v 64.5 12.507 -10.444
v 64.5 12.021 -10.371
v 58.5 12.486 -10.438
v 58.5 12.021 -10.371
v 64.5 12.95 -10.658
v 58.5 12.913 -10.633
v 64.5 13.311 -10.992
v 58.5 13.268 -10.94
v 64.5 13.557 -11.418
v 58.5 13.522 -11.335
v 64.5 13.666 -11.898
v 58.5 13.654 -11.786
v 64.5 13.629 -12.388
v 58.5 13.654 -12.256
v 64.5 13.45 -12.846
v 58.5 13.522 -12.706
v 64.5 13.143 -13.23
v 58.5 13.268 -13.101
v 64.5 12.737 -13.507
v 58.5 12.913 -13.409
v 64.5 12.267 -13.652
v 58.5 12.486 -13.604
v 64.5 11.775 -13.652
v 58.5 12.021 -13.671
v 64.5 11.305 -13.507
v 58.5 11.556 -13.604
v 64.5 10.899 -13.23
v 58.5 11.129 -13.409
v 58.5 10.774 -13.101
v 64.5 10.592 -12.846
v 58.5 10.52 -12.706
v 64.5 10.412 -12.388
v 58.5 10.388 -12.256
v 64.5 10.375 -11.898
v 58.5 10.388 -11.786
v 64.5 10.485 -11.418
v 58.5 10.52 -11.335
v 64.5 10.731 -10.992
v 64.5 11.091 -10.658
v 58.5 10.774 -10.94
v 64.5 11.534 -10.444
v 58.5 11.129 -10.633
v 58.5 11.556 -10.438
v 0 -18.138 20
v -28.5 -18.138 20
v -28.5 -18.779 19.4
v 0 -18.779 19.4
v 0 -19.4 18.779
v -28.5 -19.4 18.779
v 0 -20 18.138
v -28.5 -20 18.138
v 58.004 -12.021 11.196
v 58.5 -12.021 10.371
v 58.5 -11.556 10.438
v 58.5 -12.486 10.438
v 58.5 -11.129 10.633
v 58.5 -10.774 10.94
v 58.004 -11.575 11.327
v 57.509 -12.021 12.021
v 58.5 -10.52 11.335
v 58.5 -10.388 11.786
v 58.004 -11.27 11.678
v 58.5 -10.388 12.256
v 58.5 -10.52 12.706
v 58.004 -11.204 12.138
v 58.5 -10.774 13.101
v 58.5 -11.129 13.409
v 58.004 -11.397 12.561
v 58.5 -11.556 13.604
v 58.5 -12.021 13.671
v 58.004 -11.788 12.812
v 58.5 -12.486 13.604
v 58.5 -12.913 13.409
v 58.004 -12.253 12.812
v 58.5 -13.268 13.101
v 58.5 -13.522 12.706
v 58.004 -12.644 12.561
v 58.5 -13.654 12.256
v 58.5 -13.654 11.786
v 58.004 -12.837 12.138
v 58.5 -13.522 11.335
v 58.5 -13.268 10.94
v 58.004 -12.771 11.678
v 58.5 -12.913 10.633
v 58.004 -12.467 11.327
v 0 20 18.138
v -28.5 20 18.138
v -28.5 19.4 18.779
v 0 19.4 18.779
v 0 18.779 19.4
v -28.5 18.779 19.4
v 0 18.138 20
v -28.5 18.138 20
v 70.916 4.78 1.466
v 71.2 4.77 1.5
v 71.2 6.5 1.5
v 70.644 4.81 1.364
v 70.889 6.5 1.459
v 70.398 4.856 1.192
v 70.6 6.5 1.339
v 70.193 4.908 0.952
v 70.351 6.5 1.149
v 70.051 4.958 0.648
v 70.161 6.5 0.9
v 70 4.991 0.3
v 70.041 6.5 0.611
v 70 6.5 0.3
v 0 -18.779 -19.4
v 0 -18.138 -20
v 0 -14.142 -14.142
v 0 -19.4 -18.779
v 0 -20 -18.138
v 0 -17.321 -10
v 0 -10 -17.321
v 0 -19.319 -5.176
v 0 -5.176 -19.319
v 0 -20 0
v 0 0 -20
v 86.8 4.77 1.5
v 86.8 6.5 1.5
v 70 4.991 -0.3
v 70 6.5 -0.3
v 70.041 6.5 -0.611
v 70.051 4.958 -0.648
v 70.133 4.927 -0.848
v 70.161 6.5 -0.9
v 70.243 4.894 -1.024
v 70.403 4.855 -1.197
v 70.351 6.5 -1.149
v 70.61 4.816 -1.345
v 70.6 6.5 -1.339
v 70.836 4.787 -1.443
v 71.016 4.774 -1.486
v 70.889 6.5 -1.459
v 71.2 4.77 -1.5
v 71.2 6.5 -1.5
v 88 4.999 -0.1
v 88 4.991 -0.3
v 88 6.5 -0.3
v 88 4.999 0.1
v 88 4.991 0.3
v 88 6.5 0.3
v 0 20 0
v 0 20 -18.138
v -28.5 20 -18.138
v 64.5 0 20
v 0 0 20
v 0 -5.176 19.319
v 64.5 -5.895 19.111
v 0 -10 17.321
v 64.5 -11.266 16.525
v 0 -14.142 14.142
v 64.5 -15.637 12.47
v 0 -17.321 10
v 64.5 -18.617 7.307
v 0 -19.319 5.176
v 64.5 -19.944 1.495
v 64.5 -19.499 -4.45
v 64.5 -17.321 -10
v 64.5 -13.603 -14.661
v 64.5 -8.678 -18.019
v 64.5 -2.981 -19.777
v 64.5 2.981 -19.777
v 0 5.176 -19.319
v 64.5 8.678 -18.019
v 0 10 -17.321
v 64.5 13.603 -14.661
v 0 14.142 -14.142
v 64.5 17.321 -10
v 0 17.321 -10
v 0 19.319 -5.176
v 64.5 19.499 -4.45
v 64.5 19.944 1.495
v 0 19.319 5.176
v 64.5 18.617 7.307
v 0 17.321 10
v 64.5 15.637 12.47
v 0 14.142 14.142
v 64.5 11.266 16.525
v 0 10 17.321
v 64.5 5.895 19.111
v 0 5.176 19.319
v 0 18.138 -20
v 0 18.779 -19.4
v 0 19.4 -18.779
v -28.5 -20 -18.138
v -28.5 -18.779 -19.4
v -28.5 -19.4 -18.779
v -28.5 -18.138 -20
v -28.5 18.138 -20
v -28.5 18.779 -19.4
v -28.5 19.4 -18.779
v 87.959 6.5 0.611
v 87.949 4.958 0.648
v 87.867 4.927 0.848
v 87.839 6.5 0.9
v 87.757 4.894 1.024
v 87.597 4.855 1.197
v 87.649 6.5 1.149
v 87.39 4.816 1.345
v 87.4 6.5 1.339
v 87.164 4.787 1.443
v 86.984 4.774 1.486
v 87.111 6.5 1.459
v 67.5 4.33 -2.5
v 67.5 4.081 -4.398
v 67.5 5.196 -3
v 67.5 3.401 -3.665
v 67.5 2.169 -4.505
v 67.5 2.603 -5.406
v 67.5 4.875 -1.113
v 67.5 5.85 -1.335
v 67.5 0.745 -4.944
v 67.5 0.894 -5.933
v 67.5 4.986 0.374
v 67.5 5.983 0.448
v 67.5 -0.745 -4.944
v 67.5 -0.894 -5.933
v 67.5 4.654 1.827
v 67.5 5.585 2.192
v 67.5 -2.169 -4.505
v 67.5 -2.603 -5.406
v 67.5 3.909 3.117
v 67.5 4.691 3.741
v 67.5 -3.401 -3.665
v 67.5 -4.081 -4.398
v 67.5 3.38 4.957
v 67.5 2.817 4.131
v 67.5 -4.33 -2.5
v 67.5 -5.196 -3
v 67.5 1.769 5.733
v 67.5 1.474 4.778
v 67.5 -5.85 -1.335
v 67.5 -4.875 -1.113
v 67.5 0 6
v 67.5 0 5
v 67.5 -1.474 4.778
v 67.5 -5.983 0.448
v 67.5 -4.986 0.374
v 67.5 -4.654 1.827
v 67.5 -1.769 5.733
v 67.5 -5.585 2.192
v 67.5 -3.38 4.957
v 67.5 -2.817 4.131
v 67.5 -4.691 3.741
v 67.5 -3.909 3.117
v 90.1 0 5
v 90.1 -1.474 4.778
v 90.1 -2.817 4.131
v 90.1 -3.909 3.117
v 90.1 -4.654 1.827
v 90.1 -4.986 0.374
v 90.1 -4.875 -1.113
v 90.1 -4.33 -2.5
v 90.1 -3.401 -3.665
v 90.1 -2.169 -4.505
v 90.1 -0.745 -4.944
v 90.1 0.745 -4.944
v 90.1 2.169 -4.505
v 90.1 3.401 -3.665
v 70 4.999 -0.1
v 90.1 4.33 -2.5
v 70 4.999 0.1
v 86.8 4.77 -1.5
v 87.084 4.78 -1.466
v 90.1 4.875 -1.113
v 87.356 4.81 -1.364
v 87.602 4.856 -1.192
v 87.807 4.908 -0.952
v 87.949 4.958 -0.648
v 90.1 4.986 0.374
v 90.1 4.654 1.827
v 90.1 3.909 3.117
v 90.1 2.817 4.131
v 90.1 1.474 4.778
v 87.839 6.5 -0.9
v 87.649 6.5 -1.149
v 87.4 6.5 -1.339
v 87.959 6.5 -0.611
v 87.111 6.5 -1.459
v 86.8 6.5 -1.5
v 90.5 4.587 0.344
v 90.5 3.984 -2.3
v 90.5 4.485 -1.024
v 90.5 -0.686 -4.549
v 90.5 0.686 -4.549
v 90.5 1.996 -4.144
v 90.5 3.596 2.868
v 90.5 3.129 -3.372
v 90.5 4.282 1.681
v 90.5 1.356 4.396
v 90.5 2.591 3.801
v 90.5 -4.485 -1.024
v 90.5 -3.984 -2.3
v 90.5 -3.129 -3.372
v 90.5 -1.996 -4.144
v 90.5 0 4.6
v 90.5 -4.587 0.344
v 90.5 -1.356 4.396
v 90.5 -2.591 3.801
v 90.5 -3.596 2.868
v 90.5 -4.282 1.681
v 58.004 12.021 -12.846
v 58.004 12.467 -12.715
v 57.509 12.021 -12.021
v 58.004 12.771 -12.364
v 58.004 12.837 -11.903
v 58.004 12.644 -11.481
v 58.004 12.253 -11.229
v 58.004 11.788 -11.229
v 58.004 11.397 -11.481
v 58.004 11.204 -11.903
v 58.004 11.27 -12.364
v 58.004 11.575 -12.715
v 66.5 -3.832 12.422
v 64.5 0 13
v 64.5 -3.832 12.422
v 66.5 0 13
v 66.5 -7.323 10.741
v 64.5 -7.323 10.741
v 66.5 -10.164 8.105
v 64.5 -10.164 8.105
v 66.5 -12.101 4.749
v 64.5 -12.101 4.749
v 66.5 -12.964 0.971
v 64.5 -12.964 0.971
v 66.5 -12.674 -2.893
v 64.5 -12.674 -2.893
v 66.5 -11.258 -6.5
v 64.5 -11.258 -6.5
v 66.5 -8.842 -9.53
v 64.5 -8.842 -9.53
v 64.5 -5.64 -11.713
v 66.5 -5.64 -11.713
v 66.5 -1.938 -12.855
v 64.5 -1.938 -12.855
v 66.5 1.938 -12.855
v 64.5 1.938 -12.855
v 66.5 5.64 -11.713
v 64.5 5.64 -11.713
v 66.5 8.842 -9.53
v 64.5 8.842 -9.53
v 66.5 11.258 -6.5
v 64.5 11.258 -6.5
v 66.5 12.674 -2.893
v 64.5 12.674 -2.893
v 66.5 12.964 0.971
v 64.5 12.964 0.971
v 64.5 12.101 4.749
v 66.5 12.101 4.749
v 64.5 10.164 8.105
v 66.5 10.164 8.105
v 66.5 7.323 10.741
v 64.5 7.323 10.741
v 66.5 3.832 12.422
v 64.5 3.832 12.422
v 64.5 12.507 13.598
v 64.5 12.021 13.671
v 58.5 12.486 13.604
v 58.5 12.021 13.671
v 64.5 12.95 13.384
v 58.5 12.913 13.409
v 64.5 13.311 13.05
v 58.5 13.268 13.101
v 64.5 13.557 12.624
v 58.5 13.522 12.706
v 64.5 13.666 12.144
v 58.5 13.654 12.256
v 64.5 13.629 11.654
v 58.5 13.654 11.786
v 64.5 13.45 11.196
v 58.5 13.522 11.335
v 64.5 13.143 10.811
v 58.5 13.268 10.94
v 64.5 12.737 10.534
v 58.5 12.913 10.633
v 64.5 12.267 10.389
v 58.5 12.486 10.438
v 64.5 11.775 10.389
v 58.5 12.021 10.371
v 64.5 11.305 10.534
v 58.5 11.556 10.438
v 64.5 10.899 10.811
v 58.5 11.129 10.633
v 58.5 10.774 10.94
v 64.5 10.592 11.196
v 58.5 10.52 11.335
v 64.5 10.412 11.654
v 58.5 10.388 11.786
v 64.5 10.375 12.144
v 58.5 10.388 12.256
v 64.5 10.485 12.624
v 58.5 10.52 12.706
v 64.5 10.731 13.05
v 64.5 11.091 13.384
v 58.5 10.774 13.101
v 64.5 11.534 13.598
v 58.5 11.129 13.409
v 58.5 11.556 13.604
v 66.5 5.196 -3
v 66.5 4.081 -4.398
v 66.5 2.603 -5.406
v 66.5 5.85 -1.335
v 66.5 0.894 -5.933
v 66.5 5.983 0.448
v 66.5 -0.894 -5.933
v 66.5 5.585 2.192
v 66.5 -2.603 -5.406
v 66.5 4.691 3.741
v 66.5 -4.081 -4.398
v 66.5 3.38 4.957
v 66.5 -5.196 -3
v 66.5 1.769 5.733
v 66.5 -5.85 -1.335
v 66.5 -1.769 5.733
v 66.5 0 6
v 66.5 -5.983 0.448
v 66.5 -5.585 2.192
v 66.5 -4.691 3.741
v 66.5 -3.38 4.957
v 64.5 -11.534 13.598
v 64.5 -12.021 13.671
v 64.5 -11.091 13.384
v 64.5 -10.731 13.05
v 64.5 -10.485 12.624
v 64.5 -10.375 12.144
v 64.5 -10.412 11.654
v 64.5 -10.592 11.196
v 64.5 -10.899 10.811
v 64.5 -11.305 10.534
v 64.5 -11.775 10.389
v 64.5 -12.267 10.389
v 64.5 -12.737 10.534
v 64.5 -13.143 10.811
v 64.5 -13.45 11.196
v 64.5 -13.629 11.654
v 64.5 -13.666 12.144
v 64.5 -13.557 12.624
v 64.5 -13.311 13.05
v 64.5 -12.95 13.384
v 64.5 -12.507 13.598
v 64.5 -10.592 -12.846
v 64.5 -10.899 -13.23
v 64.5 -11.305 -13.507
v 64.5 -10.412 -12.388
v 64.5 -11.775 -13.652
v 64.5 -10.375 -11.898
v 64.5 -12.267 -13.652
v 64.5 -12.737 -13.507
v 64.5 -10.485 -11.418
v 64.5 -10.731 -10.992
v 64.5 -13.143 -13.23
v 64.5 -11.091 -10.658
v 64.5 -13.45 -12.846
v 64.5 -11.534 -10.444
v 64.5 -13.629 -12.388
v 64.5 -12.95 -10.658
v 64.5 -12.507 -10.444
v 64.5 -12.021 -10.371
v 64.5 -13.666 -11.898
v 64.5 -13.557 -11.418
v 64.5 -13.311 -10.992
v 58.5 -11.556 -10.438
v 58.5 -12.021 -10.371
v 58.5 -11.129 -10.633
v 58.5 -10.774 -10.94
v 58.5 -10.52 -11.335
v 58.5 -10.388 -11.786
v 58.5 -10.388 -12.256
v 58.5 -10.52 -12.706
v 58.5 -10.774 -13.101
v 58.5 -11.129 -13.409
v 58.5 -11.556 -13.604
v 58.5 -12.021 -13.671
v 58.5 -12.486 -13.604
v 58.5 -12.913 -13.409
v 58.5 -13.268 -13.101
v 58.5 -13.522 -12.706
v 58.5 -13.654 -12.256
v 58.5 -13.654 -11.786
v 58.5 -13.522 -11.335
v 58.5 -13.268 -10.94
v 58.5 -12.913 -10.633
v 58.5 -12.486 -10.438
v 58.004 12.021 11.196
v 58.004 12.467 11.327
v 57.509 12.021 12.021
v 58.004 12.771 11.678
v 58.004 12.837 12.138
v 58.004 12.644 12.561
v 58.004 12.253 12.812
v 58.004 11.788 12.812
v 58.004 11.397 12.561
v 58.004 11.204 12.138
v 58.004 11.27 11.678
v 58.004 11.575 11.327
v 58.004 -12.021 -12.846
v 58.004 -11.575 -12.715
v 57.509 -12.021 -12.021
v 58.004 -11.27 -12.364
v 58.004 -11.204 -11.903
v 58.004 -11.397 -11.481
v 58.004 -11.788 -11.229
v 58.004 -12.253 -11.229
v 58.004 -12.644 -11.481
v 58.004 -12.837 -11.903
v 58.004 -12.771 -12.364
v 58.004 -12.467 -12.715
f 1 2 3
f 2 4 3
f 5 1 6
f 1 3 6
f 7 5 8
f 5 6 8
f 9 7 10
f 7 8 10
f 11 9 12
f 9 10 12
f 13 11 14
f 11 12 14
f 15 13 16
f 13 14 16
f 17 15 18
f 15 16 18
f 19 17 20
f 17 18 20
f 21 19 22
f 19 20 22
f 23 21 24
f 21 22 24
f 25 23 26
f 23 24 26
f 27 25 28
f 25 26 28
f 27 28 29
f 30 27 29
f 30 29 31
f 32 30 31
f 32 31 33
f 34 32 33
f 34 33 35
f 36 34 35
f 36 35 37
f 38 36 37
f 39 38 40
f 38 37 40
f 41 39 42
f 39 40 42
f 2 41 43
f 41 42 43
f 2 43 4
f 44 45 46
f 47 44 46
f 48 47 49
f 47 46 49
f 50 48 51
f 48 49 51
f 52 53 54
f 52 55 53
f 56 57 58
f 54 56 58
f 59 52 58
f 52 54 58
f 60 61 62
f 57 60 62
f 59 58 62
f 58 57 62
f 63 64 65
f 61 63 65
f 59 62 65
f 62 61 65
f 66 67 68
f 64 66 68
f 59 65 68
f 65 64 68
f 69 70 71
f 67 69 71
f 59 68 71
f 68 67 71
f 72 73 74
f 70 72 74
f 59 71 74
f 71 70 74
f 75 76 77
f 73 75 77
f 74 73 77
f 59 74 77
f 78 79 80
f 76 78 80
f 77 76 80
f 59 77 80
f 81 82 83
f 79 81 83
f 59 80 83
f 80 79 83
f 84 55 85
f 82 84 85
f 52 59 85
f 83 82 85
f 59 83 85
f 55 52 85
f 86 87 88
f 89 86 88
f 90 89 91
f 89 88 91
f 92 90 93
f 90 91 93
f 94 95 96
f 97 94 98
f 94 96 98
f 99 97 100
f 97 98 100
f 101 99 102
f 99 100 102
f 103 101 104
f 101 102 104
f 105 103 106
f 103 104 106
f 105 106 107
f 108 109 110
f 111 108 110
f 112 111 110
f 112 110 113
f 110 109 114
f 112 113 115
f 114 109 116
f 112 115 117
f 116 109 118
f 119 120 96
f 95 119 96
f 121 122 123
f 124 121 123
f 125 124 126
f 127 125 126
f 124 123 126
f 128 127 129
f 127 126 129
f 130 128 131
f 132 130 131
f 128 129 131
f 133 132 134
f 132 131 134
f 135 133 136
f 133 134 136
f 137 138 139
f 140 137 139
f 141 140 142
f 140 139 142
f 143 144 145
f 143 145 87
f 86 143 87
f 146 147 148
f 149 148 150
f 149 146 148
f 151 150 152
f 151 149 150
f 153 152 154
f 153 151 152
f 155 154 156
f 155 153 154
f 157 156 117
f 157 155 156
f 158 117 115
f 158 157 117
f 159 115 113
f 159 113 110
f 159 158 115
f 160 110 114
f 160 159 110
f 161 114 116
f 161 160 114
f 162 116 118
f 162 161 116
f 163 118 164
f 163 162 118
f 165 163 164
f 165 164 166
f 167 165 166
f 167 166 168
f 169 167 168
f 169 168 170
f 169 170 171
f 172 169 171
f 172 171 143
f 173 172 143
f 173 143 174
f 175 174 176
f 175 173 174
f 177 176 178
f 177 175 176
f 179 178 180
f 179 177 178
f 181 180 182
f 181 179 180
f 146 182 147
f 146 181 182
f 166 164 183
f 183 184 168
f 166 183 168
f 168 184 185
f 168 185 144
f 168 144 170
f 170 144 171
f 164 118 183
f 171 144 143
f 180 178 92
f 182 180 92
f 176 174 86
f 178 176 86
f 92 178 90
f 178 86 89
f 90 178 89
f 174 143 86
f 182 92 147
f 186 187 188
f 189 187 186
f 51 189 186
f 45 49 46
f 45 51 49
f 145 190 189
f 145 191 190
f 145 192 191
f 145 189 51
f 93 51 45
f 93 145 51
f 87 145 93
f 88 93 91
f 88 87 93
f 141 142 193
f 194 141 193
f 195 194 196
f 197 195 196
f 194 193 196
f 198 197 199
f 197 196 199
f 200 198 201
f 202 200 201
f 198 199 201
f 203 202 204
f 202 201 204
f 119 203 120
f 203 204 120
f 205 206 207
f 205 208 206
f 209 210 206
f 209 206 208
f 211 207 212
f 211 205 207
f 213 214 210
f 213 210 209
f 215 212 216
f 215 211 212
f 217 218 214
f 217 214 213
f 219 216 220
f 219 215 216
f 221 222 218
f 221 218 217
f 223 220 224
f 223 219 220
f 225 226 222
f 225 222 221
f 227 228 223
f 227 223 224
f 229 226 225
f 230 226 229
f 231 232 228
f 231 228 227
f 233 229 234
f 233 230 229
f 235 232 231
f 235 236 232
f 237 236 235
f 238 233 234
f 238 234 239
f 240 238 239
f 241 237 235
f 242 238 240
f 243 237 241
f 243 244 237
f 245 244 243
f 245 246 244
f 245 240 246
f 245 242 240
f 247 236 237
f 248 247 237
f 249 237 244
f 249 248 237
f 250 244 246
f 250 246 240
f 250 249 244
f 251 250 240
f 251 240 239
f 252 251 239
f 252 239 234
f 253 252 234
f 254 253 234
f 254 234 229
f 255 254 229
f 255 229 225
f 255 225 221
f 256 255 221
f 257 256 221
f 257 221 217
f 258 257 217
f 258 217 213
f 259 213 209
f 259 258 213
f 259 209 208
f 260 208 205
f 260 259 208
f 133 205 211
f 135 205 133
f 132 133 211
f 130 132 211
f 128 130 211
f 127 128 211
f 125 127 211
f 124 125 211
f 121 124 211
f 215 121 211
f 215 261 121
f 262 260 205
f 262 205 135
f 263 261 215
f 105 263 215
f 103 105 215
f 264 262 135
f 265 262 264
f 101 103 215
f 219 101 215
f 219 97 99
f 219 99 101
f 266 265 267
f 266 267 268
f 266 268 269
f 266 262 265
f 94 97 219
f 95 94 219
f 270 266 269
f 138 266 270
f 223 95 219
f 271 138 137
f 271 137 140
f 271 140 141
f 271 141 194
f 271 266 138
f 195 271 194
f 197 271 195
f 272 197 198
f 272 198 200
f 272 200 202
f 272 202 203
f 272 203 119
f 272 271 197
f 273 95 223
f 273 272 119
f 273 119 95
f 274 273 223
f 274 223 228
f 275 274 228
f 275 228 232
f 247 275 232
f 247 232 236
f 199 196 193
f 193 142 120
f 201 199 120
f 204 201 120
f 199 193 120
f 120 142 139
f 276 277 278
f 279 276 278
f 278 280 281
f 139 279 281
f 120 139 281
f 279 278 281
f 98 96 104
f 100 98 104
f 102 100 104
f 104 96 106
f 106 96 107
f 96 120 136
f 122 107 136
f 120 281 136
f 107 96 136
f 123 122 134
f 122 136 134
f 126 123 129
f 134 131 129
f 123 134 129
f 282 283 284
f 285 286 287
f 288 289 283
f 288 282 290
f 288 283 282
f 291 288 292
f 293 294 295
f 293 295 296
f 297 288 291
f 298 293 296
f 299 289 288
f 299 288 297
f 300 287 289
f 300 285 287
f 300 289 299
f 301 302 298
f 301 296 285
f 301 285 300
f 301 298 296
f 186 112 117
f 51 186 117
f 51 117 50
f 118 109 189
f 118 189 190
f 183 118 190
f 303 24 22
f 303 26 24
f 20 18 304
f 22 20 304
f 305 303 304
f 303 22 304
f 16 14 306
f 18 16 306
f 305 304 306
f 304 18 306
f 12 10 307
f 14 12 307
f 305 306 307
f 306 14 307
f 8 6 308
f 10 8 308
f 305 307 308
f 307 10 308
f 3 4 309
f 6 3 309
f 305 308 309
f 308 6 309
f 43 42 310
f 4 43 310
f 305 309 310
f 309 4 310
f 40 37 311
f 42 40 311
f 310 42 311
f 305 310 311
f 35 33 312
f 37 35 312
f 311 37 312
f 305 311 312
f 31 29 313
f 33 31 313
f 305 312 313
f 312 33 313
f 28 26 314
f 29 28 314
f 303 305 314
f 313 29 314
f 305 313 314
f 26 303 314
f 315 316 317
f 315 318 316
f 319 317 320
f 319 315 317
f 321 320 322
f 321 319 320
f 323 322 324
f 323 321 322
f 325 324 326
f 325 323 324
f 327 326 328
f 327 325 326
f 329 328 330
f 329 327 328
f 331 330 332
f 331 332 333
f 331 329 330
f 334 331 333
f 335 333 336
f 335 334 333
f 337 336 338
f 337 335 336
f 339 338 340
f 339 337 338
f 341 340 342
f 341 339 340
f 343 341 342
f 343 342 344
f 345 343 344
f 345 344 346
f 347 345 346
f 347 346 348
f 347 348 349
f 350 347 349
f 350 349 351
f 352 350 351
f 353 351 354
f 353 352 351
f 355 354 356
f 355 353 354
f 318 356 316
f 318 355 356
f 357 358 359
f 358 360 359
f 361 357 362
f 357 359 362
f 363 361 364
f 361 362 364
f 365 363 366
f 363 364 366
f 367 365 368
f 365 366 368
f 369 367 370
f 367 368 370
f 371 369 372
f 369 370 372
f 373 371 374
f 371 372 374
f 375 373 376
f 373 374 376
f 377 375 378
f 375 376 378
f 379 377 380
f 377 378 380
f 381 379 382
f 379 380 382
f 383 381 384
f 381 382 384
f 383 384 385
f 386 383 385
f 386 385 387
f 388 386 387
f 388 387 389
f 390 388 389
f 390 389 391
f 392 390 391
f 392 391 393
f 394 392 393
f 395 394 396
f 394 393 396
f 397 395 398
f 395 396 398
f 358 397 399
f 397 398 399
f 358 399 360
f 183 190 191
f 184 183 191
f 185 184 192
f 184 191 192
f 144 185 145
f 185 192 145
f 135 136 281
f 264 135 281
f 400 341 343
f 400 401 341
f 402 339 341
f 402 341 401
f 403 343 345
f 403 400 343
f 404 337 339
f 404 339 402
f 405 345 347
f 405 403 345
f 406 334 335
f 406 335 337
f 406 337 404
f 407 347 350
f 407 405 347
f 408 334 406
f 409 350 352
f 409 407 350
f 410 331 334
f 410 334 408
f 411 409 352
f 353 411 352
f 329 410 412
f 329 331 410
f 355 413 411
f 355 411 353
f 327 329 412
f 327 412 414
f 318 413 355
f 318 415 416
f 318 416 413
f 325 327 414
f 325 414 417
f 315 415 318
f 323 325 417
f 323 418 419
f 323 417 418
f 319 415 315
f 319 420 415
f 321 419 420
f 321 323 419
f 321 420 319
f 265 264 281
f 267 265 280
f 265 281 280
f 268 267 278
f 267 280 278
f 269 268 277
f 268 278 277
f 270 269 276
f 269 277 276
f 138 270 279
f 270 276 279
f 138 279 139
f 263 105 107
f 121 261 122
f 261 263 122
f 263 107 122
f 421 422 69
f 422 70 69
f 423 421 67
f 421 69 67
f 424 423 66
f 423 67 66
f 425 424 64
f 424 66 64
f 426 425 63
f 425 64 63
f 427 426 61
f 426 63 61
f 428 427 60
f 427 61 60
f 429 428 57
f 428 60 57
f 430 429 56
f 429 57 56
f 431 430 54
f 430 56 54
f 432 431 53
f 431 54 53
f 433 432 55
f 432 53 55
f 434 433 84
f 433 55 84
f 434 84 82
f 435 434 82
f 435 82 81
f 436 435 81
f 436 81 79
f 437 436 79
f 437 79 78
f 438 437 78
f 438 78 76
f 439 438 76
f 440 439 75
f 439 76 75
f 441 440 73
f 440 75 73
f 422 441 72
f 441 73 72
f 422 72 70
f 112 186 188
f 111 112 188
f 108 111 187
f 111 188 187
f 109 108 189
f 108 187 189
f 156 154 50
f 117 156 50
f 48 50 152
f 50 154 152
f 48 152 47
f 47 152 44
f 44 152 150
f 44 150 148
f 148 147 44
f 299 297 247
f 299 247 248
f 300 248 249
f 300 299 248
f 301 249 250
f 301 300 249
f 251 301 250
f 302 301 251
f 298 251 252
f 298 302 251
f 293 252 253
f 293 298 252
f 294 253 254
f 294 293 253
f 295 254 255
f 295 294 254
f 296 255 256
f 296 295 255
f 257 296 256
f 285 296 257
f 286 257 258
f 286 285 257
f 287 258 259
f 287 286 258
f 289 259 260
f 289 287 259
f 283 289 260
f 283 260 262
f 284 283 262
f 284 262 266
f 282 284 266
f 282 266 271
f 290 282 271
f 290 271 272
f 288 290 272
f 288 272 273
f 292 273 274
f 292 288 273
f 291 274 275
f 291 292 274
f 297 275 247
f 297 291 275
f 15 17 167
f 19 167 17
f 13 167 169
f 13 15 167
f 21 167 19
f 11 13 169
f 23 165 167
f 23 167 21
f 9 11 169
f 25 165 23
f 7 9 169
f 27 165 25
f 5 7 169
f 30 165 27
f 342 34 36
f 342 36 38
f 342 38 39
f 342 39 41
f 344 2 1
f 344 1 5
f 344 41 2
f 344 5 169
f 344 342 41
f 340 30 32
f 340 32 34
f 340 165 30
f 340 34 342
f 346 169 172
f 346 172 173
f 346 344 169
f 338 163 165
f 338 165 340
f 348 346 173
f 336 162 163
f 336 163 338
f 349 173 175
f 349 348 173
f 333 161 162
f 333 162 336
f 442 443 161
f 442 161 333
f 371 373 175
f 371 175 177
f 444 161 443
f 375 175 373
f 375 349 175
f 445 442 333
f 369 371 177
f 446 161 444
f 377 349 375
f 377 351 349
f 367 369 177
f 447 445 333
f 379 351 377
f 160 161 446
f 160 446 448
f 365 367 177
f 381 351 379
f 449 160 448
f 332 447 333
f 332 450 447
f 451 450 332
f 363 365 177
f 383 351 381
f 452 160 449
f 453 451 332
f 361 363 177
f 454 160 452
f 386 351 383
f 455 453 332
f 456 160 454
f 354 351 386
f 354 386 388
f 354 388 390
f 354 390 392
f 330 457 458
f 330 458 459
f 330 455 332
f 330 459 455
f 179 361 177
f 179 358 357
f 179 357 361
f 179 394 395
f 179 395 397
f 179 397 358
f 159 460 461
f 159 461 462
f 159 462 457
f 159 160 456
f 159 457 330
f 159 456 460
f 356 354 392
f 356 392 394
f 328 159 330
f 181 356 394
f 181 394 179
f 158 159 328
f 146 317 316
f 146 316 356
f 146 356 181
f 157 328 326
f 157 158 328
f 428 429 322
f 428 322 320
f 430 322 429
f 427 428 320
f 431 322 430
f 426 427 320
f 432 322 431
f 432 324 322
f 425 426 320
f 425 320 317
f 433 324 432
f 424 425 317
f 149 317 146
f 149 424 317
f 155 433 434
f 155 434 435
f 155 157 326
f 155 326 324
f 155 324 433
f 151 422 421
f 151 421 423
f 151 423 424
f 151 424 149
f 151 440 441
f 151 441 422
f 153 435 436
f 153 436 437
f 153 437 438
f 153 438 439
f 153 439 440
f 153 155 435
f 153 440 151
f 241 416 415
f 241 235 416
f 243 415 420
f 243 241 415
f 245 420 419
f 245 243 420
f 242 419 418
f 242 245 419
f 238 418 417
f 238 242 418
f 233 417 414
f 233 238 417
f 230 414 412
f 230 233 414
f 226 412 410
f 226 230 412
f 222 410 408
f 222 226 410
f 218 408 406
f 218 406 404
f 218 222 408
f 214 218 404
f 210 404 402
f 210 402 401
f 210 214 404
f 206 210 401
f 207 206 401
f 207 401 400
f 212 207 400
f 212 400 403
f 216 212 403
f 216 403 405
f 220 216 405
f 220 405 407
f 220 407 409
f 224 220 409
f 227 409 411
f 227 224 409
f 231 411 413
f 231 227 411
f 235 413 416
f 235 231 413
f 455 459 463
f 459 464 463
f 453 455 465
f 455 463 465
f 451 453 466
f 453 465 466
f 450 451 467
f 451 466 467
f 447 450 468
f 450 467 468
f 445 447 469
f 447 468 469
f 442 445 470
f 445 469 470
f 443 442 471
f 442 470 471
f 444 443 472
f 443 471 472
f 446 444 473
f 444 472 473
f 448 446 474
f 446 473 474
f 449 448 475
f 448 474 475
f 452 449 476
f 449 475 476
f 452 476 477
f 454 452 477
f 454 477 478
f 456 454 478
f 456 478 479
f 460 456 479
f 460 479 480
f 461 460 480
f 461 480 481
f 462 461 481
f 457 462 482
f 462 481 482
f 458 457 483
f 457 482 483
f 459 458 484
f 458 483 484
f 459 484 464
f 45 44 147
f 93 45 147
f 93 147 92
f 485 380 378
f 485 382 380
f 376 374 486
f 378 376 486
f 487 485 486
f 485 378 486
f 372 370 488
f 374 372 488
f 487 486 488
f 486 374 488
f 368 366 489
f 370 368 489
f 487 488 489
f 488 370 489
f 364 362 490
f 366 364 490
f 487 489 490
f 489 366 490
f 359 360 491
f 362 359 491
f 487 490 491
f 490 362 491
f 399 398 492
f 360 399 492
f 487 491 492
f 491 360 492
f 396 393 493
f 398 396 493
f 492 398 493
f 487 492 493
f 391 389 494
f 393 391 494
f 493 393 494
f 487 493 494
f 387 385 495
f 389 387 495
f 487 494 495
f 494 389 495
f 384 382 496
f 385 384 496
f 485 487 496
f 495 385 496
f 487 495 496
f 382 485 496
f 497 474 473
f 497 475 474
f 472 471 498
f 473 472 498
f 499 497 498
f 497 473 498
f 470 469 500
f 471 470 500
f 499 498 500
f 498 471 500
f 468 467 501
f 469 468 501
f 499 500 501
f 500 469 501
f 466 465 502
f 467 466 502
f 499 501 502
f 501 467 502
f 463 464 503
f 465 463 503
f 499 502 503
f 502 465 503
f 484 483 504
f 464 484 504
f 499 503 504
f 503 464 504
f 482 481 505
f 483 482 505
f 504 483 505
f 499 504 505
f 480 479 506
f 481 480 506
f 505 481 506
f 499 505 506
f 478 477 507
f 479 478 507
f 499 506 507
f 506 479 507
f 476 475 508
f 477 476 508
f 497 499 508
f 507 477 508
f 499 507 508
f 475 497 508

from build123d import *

# Parameters (mm, degrees)
M4_TAPPED_HOLE1_D     = 3.3
M4_TAPPED_HOLE1_DEPTH = 6
M4_TAPPED_HOLE1_TIP   = 0.991420021
SKETCH6_W             = 40
SKETCH6_H             = 40
BOSS_EXTRUDE1_DEPTH   = 28.5
CUT_EXTRUDE1_REACH    = 124.315
CIRPATTERN1_COUNT     = 4
CHAMFER1_SIZE         = 0.4
BOSS_EXTRUDE2_DEPTH   = 1.5


with BuildPart() as part:
    # Sketch1 → Revolve1 (revolve)
    with BuildSketch(Plane.XY, mode=Mode.PRIVATE) as revolve1_sk:
        Polygon((0, 0), (0, 20), (64.5, 20), (64.5, 13), (66.5, 13), (66.5, 6), (67.5, 6), (67.5, 5), (90.5, 5), (90.5, 0), align=None)
    revolve(revolve1_sk.sketch.rotate(Axis((0, 0, 0), (1, 0, 0)), 90), axis=Axis((0, 0, 0), (1, 0, 0)))

    # M4 Tapped Hole1
    with Locations(Plane(origin=(64.5, 0, 0), x_dir=(0, 0, -1), z_dir=(1, 0, 0))):
        with Locations((12.02081528, -12.02081528), (12.02081528, 12.02081528), (-12.02081528, -12.02081528), (-12.02081528, 12.02081528)):
            Hole(M4_TAPPED_HOLE1_D / 2, depth=M4_TAPPED_HOLE1_DEPTH)
            with Locations((0, 0, -(M4_TAPPED_HOLE1_DEPTH + M4_TAPPED_HOLE1_TIP / 2))):  # 118° drill point
                Cone(0, M4_TAPPED_HOLE1_D / 2, M4_TAPPED_HOLE1_TIP, mode=Mode.SUBTRACT)

    # Sketch6 → Boss-Extrude1 (add)
    with BuildSketch(Plane.ZY):
        Rectangle(SKETCH6_W, SKETCH6_H)
    extrude(amount=BOSS_EXTRUDE1_DEPTH)

    # Sketch7 → Cut-Extrude1 (cut, up to next)
    with BuildSketch(Plane.ZY.offset(28.5), mode=Mode.PRIVATE) as cut_extrude1_sk1:
        with BuildLine():
            Line((-20, 20), (-20, 18.138357147))
            ThreePointArc((-20, 18.138357147), (-19.091883092, 19.091883092), (-18.138357147, 20))
            Line((-18.138357147, 20), (-20, 20))
        make_face()
    cut_extrude1_tool1 = extrude(cut_extrude1_sk1.sketch, amount=-CUT_EXTRUDE1_REACH, mode=Mode.PRIVATE) & part.part
    cut_extrude1 = cut_extrude1_tool1.solids().sort_by_distance((-28.5, 19.389578, -19.389578))[0]
    add(cut_extrude1, mode=Mode.SUBTRACT)

    # CirPattern1: Cut-Extrude1 ×4 about axis
    cirpattern1_axis = Axis((0, 0, 0), (-1, 0, 0))
    for i in range(1, CIRPATTERN1_COUNT):
        add(cut_extrude1.rotate(cirpattern1_axis, i * 360 / CIRPATTERN1_COUNT), mode=Mode.SUBTRACT)

    # Chamfer1
    chamfer1_edges = [part.edges().sort_by_distance(p)[0] for p in [
        (90.5, 0, -5),
    ]]
    chamfer(chamfer1_edges, length=CHAMFER1_SIZE)

    # Sketch8 → Boss-Extrude2 (add, symmetric)
    with BuildSketch(Plane(origin=(0, 5, 0), x_dir=(1, 0, 0), z_dir=(0, 1, 0))):
        with BuildLine():
            Line((71.2, 1.5), (86.8, 1.5))
            ThreePointArc((86.8, 1.5), (87.648528137, 1.148528137), (88, 0.3))
            Line((88, 0.3), (88, -0.3))
            ThreePointArc((88, -0.3), (87.648528137, -1.148528137), (86.8, -1.5))
            Line((86.8, -1.5), (71.2, -1.5))
            ThreePointArc((71.2, -1.5), (70.351471863, -1.148528137), (70, -0.3))
            Line((70, -0.3), (70, 0.3))
            ThreePointArc((70, 0.3), (70.351471863, 1.148528137), (71.2, 1.5))
        make_face()
    extrude(amount=BOSS_EXTRUDE2_DEPTH, both=True)


solid = part.part
